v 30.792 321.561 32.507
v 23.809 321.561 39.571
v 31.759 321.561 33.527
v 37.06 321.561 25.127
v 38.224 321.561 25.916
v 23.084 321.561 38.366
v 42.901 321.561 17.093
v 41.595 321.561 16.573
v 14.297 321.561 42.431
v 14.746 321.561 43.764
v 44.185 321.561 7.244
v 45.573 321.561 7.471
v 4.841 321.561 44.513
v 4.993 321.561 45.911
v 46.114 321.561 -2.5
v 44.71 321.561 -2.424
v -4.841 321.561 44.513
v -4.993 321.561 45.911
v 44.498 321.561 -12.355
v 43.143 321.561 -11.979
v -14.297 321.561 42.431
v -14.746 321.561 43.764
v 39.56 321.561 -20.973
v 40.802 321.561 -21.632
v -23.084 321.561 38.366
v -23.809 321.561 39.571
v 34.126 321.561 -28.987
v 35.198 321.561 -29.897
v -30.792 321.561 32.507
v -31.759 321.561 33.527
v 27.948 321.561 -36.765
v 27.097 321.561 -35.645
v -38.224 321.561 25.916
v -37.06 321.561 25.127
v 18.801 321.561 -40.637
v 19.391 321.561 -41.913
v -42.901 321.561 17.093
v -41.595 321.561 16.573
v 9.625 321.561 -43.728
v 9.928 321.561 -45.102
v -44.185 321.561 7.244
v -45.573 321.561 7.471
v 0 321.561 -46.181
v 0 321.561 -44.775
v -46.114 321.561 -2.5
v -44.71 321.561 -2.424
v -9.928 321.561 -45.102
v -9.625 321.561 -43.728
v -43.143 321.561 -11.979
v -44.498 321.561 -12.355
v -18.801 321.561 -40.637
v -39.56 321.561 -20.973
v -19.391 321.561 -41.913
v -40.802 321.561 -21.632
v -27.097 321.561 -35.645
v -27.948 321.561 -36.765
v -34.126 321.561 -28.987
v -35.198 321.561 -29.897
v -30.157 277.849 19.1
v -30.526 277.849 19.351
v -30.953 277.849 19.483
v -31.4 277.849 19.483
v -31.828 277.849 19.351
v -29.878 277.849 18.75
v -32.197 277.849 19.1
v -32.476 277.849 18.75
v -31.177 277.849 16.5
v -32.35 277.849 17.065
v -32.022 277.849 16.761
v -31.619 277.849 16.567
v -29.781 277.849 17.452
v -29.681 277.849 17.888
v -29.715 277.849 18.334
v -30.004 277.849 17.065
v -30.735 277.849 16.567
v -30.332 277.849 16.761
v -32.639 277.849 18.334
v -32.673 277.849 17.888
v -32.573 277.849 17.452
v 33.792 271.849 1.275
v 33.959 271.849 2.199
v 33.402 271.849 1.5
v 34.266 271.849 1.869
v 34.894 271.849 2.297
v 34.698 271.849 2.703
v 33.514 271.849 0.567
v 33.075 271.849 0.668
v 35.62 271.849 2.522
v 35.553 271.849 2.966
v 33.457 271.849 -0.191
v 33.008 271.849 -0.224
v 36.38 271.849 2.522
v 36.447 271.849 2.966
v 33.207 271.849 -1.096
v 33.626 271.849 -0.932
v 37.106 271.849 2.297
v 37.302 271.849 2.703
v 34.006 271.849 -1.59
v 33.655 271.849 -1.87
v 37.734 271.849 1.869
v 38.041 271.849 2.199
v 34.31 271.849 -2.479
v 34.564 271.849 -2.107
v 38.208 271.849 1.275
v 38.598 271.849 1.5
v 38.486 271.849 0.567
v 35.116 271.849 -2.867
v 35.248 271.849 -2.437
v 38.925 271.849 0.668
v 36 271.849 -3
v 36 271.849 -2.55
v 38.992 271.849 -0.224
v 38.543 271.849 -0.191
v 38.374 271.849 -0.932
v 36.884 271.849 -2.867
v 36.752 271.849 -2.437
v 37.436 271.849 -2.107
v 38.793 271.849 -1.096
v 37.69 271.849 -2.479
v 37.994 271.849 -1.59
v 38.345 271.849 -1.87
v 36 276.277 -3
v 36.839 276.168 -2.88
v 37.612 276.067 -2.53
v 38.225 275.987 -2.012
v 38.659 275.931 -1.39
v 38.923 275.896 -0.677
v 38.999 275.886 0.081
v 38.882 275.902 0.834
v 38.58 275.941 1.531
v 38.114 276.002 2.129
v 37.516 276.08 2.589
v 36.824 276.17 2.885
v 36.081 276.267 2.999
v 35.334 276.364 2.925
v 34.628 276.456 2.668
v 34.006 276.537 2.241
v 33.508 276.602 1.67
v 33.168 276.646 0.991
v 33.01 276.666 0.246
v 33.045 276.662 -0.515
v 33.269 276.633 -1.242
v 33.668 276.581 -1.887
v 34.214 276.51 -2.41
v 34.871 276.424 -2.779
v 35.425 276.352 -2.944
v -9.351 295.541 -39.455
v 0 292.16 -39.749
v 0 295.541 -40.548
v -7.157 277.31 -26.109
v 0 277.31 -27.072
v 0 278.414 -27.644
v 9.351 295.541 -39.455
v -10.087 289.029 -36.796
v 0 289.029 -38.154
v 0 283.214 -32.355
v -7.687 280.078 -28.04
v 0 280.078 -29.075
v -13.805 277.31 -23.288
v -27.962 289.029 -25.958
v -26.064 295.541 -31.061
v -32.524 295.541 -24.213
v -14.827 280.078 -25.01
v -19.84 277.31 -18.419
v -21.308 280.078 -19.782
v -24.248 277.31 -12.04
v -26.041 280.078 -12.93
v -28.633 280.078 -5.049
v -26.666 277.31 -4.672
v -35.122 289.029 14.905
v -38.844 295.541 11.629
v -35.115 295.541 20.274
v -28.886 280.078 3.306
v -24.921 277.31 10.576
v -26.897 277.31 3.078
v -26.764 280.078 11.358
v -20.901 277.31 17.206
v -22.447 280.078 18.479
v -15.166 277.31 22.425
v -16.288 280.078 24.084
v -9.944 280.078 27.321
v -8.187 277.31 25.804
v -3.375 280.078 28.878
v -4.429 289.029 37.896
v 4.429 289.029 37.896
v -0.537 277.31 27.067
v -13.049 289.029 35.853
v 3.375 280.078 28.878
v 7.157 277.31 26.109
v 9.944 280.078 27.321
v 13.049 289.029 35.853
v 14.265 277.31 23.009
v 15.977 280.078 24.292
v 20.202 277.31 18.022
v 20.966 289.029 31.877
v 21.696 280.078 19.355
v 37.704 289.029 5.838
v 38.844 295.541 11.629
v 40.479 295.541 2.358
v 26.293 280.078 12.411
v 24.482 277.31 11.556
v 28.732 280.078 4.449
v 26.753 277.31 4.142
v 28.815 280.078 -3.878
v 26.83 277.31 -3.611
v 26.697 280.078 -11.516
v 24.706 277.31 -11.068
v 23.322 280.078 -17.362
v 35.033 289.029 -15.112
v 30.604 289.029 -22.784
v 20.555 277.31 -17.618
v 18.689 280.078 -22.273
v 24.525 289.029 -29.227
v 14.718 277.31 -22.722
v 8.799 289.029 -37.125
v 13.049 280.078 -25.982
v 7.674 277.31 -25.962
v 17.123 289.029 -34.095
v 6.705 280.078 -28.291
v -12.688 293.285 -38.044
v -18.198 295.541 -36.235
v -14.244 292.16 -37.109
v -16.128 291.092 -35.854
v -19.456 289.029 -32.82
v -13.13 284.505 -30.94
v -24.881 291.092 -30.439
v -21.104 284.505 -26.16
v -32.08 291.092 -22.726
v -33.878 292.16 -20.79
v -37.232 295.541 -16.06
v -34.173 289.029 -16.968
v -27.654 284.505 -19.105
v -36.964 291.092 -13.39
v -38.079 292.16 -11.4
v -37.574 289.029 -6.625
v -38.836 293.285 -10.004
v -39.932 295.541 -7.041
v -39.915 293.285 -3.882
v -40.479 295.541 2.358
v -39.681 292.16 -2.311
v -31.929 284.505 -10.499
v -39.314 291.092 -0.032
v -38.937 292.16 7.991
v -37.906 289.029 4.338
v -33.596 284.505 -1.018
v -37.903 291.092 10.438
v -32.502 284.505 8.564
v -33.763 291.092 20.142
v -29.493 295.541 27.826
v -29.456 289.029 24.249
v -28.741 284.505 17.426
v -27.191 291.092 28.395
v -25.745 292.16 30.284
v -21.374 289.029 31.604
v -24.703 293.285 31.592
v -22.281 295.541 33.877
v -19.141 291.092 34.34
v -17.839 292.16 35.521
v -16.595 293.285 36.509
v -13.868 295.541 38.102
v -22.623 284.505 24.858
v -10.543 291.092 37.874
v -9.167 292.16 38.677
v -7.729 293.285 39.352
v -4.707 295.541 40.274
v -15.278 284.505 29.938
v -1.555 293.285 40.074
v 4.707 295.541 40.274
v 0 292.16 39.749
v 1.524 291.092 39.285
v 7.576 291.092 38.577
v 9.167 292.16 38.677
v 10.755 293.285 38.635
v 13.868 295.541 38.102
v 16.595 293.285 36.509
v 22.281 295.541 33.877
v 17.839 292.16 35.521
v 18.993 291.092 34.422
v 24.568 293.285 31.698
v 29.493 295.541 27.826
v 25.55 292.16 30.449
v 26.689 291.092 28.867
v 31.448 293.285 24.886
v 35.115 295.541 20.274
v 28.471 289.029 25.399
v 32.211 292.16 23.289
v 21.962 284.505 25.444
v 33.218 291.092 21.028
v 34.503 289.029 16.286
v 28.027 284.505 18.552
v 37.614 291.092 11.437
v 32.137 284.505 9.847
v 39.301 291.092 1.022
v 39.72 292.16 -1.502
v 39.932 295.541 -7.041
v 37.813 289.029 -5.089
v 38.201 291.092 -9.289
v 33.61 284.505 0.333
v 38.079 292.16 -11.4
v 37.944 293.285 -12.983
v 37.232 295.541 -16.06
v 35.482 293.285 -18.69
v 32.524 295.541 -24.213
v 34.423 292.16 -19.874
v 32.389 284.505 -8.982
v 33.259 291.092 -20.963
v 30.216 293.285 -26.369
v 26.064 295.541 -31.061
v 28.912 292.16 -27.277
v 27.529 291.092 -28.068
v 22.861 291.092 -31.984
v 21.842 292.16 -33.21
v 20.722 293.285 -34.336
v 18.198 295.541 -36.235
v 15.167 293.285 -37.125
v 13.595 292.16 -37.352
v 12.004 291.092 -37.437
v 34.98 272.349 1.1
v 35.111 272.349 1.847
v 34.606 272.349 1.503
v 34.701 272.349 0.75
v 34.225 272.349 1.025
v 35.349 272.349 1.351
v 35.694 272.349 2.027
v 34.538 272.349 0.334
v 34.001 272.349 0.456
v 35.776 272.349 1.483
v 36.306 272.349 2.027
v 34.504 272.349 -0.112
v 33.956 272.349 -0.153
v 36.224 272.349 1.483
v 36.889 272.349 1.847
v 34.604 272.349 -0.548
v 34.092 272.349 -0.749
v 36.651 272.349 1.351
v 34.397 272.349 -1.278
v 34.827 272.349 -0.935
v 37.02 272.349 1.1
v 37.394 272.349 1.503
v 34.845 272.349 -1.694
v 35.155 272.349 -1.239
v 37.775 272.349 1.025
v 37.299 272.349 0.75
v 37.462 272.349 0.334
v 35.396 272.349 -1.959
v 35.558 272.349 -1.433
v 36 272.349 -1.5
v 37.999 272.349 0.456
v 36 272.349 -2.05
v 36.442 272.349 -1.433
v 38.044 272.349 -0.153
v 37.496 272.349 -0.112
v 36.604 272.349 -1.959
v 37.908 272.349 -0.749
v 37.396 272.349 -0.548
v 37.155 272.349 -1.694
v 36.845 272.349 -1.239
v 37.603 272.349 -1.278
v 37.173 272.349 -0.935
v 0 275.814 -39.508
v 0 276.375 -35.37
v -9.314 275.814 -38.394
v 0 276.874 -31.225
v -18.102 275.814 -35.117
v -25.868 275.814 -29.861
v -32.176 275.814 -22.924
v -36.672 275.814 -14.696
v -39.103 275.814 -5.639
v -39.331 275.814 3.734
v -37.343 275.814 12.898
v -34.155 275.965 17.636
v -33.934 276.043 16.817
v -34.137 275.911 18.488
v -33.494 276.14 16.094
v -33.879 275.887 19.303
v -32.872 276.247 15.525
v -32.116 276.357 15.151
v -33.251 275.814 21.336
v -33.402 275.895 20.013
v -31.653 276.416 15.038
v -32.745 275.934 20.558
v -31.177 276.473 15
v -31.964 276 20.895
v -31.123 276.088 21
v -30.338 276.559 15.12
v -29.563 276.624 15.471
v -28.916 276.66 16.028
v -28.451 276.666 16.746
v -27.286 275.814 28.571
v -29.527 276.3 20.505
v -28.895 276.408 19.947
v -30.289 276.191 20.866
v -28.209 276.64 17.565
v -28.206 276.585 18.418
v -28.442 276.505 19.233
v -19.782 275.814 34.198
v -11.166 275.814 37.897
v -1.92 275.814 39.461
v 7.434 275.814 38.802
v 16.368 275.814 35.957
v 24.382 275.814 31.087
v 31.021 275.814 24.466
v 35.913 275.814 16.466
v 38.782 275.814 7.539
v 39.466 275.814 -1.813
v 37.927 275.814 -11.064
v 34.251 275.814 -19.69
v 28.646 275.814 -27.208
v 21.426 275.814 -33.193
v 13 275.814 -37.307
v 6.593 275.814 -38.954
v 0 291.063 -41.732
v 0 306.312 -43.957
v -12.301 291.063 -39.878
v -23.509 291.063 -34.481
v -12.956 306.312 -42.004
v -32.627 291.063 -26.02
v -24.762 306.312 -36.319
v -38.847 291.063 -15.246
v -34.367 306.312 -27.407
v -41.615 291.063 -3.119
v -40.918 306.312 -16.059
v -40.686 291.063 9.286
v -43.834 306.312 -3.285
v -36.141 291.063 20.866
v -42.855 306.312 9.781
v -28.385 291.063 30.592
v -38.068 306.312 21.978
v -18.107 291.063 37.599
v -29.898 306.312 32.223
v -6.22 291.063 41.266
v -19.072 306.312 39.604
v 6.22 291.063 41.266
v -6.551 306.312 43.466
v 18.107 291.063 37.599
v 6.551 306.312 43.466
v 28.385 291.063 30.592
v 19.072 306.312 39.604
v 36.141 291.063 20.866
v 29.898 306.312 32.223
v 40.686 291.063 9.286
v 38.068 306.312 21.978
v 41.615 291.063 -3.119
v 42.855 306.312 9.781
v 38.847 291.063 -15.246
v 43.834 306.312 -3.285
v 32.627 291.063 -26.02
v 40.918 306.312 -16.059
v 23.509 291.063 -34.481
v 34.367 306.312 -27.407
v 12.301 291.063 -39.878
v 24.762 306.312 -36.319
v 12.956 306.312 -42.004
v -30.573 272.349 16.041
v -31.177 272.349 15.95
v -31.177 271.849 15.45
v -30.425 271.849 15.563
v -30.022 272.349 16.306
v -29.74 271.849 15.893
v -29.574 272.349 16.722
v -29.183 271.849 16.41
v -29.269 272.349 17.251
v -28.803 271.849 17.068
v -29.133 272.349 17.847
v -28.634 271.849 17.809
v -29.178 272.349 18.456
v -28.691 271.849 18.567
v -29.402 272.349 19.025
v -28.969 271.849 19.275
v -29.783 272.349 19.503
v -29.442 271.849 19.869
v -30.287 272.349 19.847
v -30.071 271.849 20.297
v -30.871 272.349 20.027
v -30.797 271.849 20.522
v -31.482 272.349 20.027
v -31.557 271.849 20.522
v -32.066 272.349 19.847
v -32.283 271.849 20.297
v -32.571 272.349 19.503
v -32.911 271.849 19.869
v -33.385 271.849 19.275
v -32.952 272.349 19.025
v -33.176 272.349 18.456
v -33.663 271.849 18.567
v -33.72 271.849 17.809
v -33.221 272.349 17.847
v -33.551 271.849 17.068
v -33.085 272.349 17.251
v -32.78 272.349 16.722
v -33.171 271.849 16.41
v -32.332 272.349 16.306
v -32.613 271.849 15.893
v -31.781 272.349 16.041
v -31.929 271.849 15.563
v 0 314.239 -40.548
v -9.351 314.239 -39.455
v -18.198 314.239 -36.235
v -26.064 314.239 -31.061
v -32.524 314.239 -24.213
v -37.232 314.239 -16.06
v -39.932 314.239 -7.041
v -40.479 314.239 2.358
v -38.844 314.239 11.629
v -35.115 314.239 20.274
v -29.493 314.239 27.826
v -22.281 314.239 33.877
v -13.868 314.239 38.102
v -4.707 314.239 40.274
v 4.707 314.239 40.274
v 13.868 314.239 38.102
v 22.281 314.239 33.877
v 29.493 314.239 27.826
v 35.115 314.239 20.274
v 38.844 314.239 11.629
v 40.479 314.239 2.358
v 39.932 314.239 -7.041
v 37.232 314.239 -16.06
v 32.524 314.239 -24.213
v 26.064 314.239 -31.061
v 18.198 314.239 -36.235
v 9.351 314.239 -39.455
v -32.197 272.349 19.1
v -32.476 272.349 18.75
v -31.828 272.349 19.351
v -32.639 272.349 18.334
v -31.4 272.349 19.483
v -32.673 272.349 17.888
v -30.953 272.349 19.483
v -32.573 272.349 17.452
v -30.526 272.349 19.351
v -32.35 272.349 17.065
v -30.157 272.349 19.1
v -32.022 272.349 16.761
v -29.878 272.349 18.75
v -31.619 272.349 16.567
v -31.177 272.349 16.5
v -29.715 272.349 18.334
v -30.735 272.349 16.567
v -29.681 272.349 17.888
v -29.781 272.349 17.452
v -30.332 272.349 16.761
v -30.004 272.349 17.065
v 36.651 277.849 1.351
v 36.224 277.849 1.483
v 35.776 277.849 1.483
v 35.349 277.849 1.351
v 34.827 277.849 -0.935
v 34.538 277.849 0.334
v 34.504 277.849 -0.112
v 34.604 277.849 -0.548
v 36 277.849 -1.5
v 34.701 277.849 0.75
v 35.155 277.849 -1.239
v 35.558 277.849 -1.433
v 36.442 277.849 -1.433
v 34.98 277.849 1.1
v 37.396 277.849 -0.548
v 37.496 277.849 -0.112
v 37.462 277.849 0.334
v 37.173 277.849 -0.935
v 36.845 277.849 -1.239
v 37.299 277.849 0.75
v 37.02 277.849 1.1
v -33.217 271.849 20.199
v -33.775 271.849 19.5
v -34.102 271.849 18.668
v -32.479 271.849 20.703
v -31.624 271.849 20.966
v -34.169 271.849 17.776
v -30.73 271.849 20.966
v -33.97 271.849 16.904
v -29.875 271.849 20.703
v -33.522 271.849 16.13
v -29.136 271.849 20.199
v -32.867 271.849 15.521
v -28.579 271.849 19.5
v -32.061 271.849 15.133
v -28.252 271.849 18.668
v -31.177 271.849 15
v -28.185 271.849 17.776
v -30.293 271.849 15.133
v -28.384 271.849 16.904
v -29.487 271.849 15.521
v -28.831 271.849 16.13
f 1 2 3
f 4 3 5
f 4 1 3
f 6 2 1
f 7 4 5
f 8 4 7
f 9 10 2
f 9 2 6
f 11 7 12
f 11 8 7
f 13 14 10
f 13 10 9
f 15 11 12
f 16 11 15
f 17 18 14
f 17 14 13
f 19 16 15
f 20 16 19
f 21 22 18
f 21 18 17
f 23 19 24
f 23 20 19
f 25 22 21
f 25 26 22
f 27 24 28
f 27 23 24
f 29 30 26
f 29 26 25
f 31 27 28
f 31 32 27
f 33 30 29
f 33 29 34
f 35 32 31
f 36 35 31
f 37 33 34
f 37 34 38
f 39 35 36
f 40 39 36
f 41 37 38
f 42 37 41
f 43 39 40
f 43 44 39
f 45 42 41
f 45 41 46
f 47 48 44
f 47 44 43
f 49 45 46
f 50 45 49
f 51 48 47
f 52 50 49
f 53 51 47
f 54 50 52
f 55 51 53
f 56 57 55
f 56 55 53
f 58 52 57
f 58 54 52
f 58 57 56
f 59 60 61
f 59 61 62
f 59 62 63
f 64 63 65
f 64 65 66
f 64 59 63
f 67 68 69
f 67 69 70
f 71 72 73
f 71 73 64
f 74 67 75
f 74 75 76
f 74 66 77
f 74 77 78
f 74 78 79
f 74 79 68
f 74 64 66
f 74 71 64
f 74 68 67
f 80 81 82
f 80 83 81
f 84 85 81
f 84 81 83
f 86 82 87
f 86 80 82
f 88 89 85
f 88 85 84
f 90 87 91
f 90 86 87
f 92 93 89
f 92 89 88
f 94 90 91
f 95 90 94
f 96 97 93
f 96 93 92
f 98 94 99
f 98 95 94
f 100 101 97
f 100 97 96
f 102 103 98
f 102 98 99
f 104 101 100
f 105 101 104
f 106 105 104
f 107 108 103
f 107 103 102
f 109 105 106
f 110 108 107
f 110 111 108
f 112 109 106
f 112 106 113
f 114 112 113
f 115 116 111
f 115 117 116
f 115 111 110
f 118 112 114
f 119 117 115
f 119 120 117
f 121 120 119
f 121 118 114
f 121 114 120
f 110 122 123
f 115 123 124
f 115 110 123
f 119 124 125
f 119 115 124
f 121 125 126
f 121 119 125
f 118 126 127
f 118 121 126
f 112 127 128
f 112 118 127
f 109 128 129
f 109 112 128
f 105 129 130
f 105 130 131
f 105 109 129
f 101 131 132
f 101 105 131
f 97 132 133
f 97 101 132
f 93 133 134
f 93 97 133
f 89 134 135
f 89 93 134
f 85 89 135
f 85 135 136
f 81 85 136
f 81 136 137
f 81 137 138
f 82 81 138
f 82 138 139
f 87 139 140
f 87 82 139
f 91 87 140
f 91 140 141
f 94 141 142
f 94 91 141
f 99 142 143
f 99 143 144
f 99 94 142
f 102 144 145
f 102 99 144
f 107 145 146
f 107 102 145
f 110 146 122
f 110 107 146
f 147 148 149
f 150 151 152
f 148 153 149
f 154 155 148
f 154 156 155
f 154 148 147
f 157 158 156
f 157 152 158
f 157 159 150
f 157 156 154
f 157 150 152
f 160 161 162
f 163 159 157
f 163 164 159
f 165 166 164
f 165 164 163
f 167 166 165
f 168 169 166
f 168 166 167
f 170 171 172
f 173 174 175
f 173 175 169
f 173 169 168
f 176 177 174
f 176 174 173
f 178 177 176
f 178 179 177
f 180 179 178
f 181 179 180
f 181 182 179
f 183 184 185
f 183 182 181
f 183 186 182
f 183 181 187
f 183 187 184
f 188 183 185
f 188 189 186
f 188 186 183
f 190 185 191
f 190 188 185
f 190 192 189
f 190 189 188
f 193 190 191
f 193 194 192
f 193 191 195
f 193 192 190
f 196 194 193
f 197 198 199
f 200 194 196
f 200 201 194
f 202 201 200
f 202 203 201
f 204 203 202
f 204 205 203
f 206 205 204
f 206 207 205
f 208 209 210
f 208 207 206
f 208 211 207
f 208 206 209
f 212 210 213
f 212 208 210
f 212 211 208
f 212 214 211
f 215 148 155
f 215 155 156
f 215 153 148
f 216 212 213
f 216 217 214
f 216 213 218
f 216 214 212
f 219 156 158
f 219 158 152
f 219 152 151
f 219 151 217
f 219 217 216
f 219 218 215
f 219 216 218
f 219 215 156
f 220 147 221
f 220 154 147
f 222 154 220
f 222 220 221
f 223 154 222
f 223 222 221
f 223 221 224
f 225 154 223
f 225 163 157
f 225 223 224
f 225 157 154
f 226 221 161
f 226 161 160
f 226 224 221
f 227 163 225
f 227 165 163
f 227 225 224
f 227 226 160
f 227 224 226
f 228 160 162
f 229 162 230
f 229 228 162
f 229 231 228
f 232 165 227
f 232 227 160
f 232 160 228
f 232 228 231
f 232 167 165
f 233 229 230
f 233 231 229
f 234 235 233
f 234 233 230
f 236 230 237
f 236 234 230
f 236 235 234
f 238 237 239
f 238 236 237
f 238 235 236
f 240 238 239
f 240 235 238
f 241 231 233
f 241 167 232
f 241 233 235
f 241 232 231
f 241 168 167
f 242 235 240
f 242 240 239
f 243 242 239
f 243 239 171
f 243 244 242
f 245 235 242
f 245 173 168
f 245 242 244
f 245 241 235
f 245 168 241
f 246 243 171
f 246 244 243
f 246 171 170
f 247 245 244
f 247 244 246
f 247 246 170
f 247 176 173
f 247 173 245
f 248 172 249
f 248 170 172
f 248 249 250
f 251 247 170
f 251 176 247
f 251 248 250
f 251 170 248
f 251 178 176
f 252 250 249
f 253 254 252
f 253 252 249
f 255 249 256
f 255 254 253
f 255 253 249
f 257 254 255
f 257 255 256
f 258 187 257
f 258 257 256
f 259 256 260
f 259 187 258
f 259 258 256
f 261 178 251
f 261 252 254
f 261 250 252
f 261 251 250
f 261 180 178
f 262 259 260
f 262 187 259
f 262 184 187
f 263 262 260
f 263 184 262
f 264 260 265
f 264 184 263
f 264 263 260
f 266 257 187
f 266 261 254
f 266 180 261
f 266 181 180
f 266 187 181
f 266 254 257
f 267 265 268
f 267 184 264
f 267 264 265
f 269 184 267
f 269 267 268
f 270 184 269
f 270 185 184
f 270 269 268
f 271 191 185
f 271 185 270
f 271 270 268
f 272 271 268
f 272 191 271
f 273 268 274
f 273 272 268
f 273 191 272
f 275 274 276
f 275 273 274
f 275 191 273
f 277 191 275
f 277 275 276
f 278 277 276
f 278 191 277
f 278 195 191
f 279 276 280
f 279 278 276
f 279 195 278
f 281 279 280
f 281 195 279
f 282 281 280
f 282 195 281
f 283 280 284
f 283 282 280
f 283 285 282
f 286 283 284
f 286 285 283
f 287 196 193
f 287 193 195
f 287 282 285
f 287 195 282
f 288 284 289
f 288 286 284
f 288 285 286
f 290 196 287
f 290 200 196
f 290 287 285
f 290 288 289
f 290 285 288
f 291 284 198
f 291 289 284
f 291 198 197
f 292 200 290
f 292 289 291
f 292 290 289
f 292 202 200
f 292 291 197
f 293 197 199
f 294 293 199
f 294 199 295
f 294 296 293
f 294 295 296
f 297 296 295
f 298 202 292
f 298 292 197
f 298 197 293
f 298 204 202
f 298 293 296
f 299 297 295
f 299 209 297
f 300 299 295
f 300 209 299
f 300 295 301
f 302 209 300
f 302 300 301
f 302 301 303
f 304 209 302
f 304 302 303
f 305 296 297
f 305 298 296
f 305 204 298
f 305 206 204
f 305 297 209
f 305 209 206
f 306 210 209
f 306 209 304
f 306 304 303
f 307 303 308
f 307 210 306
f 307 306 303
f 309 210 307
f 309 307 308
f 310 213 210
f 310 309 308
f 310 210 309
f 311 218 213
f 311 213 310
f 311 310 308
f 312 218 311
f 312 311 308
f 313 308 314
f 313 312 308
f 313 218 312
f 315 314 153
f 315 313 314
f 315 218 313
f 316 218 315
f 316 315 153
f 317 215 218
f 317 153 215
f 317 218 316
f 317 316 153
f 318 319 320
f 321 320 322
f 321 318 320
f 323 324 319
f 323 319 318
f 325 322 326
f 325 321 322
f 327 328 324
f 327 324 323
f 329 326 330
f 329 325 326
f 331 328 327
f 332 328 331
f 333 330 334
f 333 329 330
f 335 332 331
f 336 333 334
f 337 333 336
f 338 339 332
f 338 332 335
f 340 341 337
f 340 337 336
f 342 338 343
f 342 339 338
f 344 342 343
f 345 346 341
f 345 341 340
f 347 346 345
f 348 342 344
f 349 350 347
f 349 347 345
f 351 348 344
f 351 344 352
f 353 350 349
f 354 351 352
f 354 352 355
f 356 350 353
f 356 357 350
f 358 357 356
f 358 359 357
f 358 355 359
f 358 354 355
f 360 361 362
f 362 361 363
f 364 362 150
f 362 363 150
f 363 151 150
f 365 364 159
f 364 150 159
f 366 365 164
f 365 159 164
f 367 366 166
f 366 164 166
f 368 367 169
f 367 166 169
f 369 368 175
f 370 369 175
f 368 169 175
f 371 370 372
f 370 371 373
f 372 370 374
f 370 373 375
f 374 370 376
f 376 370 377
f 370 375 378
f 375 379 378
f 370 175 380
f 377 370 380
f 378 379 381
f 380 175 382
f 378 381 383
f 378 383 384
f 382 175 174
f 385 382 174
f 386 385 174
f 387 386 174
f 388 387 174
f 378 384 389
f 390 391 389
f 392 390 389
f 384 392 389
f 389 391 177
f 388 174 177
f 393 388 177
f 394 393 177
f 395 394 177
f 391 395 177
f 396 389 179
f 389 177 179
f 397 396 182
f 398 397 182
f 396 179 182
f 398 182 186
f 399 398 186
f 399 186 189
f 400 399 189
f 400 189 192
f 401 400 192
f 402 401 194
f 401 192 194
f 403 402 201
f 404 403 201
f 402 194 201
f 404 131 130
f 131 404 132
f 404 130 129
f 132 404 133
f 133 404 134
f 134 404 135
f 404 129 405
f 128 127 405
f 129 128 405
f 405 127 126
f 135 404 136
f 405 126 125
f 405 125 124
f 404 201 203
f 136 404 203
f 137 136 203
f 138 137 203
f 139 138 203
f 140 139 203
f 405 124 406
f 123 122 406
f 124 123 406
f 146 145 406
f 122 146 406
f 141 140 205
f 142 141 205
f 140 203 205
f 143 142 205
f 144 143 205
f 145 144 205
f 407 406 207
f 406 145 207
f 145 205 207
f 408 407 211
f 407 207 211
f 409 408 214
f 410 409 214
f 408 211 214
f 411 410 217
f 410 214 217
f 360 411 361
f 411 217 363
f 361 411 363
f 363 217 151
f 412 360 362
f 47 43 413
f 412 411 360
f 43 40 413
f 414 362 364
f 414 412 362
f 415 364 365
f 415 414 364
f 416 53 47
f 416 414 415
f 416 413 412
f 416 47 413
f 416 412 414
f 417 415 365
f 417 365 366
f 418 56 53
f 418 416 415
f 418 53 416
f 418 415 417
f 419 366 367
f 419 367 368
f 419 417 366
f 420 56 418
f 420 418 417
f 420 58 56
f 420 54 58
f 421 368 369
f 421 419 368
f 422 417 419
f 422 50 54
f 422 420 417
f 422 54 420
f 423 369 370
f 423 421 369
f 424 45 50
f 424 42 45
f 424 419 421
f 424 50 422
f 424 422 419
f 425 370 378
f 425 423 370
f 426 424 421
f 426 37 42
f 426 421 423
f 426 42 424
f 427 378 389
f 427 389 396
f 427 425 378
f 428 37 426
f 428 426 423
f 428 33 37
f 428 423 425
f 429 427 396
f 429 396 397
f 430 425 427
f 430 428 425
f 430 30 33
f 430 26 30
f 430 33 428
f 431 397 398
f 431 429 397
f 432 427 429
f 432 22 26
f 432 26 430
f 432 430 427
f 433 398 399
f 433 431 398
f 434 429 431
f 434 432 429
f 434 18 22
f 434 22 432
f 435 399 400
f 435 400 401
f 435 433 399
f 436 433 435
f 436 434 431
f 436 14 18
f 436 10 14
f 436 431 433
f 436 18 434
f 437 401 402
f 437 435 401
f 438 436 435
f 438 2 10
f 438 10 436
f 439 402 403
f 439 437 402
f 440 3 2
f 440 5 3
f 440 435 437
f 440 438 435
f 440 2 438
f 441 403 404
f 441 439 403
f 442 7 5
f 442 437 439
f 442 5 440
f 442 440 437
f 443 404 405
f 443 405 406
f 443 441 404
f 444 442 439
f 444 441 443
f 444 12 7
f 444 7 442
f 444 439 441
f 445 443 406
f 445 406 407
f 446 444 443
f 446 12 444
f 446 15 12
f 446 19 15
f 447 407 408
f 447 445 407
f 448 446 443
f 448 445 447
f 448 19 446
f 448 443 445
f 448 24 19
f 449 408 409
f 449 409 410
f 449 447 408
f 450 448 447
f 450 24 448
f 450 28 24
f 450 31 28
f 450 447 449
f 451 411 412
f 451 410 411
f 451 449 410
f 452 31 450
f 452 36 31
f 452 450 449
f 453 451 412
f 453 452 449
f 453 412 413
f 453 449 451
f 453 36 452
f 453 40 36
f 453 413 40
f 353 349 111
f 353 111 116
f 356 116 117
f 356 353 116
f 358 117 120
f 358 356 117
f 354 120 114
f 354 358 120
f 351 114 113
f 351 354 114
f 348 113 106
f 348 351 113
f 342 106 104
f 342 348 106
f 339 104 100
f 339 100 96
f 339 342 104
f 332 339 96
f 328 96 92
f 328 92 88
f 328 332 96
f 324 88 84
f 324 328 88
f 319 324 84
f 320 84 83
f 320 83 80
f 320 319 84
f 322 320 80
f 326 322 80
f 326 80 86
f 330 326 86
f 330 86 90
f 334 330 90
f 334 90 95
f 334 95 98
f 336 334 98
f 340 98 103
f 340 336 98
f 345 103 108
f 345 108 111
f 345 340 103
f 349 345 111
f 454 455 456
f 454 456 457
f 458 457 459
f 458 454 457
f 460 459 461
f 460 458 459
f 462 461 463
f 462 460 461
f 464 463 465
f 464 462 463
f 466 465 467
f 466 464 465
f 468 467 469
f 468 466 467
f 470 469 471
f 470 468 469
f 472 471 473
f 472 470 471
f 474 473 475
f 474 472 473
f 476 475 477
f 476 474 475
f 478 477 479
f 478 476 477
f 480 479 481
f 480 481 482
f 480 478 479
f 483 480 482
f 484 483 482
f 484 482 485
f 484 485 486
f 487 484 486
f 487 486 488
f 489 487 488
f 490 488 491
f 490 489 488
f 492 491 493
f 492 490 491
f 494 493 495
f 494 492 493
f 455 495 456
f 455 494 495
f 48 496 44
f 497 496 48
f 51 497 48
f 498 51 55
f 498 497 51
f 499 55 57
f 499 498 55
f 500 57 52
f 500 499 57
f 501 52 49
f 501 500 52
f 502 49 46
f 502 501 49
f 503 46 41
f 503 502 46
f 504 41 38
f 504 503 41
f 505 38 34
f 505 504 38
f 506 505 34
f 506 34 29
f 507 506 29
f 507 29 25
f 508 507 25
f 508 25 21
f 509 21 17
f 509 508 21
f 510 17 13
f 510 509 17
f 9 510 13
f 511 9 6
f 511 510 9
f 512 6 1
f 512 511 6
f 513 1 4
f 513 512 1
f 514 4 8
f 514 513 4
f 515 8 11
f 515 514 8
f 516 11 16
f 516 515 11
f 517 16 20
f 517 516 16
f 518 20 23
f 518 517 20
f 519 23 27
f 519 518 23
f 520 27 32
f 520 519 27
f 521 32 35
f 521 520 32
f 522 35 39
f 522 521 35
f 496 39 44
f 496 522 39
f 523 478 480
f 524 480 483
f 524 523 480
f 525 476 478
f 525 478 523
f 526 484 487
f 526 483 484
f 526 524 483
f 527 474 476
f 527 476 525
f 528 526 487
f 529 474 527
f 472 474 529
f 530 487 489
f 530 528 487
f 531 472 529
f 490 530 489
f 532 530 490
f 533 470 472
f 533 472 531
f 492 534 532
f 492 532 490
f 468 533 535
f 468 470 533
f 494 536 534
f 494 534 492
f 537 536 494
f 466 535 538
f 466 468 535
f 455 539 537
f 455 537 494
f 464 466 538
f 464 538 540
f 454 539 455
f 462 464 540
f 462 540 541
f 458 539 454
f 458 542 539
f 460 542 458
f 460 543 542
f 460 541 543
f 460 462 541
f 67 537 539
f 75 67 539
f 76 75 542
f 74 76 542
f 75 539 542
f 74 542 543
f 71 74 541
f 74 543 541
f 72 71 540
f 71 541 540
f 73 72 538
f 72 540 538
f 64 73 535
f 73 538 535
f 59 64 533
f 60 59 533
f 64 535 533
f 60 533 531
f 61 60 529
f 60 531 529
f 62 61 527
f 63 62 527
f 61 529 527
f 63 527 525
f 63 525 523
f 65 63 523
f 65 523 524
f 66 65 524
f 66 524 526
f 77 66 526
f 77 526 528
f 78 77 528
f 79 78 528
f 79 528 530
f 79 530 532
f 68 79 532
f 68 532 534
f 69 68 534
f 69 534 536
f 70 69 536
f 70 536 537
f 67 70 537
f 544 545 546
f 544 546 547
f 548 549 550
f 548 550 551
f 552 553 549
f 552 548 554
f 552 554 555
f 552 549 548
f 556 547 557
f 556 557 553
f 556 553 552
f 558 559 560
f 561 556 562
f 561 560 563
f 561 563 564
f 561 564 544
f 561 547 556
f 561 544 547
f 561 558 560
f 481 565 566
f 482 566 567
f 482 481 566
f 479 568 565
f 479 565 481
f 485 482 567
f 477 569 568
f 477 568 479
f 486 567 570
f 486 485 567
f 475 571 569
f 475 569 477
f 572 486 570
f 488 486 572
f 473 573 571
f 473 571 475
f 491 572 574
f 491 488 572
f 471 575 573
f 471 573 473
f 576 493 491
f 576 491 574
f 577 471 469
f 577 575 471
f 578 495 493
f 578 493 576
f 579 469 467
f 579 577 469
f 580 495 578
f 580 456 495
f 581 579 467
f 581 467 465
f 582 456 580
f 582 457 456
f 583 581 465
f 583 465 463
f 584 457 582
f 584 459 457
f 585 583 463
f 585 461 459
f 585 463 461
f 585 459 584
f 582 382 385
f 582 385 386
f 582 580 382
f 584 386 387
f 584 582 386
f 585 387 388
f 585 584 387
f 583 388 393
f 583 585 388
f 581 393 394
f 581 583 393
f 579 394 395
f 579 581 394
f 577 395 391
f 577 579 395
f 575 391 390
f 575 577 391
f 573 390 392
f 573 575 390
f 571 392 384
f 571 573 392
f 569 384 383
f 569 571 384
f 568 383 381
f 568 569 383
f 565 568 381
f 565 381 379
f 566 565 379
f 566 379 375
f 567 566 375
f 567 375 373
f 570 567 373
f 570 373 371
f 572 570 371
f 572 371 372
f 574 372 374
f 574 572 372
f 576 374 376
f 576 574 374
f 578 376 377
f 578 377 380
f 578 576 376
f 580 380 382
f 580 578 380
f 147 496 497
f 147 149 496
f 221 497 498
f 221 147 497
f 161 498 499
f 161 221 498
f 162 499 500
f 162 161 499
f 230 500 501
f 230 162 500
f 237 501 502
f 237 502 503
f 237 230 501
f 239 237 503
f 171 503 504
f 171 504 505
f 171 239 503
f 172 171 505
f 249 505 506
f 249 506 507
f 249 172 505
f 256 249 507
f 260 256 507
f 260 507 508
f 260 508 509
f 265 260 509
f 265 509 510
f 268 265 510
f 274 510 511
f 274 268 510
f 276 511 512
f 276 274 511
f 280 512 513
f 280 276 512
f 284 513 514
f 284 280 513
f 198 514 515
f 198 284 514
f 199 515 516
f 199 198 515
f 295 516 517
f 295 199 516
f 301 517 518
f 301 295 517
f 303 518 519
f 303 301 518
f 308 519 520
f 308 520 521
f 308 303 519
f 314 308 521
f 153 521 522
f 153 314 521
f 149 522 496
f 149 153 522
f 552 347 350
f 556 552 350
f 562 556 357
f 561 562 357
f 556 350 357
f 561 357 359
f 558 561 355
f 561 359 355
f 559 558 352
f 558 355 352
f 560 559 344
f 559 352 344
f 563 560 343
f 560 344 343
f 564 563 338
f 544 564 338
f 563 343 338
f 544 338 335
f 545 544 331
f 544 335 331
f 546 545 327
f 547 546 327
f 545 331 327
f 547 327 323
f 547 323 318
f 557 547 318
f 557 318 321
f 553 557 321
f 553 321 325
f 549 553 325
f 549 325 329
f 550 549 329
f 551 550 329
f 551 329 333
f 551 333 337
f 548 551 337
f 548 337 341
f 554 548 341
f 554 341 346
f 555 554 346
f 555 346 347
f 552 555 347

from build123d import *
from OCP.BRepAlgoAPI import BRepAlgoAPI_Cut
from OCP.TopTools import TopTools_ListOfShape

# Parameters (mm, degrees)
SKETCH4_R                       = 3
BOSS_EXTRUDE1_DEPTH             = 2
SKETCH4_2_R                     = 3
BOSS_EXTRUDE3_DEPTH             = 2
BOSS_EXTRUDE3_DIRECTION_2_REACH = 82.882
SKETCH13_R                      = 1.5
CUT_EXTRUDE1_DEPTH              = 6
SKETCH14_R                      = 2
CUT_EXTRUDE2_DEPTH              = 0.5
CHAMFER3_SIZE                   = 0.55


with BuildPart() as part:
    # Sketch2 → Revolve6 (revolve)
    with BuildSketch(Plane(origin=(0, 0, 0), x_dir=(0, 0, -1), z_dir=(1, 0, 0))):
        with BuildLine():
            Line((26.5077562, 274.996982717), (26.5077562, 273.848618937))
            Line((26.5077562, 273.848618937), (39.220771912, 273.848618937))
            Line((39.220771912, 273.848618937), (46.181267187, 321.561079724))
            Line((46.181267187, 321.561079724), (44.775299462, 321.561079724))
            Line((44.775299462, 321.561079724), (40.547674755, 314.238618937))
            Line((40.547674755, 314.238618937), (40.547674755, 295.540718438))
            add(Edge.make_bspline(
                [(40.547674755, 295.540718438), (40.447740466, 295.012709616), (40.292777353, 293.970757619), (39.930889755, 292.587532753), (39.516186416, 291.581451359), (39.108370782, 290.57804728), (38.439698054, 289.316986818), (37.331416086, 288.032583079), (36.368363881, 287.115418474), (35.630231264, 286.340079673), (35.016472726, 285.762737126), (34.394259795, 285.247169223), (33.635524662, 284.556557999), (32.920361334, 283.771384038), (32.129651901, 282.986073936), (31.485241784, 282.459482323), (30.914997208, 281.963476573), (30.371700346, 281.391298159), (29.782796159, 280.80462685), (29.227584581, 280.262154528), (28.724752618, 279.674853681), (28.180386253, 279.039651715), (27.651838315, 278.470209992), (27.308145935, 277.876839187), (26.995230081, 277.127164256), (26.597952618, 276.164510632), (26.464811583, 275.470548141), (26.5077562, 274.996982717)],
                knots=[0, 0, 0, 0, 0.062544048, 0.125088096, 0.156360121, 0.187632145, 0.250176193, 0.312720241, 0.375264289, 0.406536313, 0.437808337, 0.469080362, 0.500352386, 0.562896434, 0.594168458, 0.625440482, 0.656712506, 0.68798453, 0.719256554, 0.750528579, 0.781800603, 0.813072627, 0.844344651, 0.875616675, 0.906888699, 0.938160723, 1.000704771, 1.000704771, 1.000704771, 1.000704771], degree=3))
        make_face()
    revolve(axis=Axis((0, 5, 0), (0, 1, 0)))

    # Sketch4 → Boss-Extrude1 (add)
    with BuildSketch(Plane.XZ.offset(-273.848618937)):
        with Locations(Location((-31.176914536, 18, 0), (0, 0, 270))):
            Circle(SKETCH4_R)
        with Locations(Location((36, 0, 0), (0, 0, 270))):
            Circle(SKETCH4_R)
    extrude(amount=BOSS_EXTRUDE1_DEPTH)

    # Sketch7 → Revolve7 (revolve)
    with BuildSketch(Plane(origin=(0, 0, 0), x_dir=(0, 0, -1), z_dir=(1, 0, 0))):
        with BuildLine():
            Line((39.220771912, 273.848618937), (39.220771912, 272.319355593))
            ThreePointArc((39.220771912, 272.319355593), (32.873157949, 273.157923648), (26.5077562, 273.848618937))
            Line((26.5077562, 273.848618937), (26.5077562, 274.348618937))
            Line((26.5077562, 274.348618937), (39.220771912, 274.348618937))
            Line((39.220771912, 274.348618937), (39.220771912, 273.848618937))
        make_face()
    revolve(axis=Axis((0, 5, 0), (0, 1, 0)))


with BuildPart() as cut_revolve3_tool:
    # Sketch12 → Cut-Revolve3 (revolve)
    with BuildSketch(Plane(origin=(0, 0, 0), x_dir=(0, 0, -1), z_dir=(1, 0, 0))):
        with BuildLine():
            Line((26.0877562, 277.404557538), (26.0877562, 267.404557538))
            Line((26.0877562, 267.404557538), (40.0877562, 267.404557538))
            Line((40.0877562, 267.404557538), (40.0877562, 275.730375326))
            ThreePointArc((40.0877562, 275.730375326), (33.098343341, 276.655999187), (26.0877562, 277.404557538))
        make_face()
    revolve(axis=Axis((0, 5, 0), (0, 1, 0)))


with BuildPart() as part_1:
    add(part.part)

    # Cut-Revolve3: cut by cut_revolve3_tool, with a tolerance
    cut_revolve3_stock = TopTools_ListOfShape()
    cut_revolve3_stock.Append(part_1.part.wrapped)
    cut_revolve3_tools = TopTools_ListOfShape()
    cut_revolve3_tools.Append(cut_revolve3_tool.part.wrapped)
    cut_revolve3_cut = BRepAlgoAPI_Cut()
    cut_revolve3_cut.SetArguments(cut_revolve3_stock)
    cut_revolve3_cut.SetTools(cut_revolve3_tools)
    cut_revolve3_cut.SetFuzzyValue(0.00001)
    cut_revolve3_cut.Build()
    add(Compound.cast(cut_revolve3_cut.Shape()).solids(), mode=Mode.REPLACE)

    # Sketch4<2> → Boss-Extrude3 (add)
    with BuildSketch(Plane.XZ.offset(-273.848618937)):
        with Locations(Location((-31.176914536, 18, 0), (0, 0, 270))):
            Circle(SKETCH4_2_R)
        with Locations(Location((36, 0, 0), (0, 0, 270))):
            Circle(SKETCH4_2_R)
    extrude(amount=BOSS_EXTRUDE3_DEPTH)

    # Sketch4<2> → Boss-Extrude3 direction 2 (add, up to next)
    with BuildSketch(Plane.XZ.offset(-273.848618937), mode=Mode.PRIVATE) as boss_extrude3_direction_2_sk1:
        with Locations(Location((-31.176914536, 18, 0), (0, 0, 270))):
            Circle(SKETCH4_2_R)
    boss_extrude3_direction_2_tool1 = extrude(boss_extrude3_direction_2_sk1.sketch, amount=-BOSS_EXTRUDE3_DIRECTION_2_REACH, mode=Mode.PRIVATE) - part_1.part
    # Sketch4<2> → Boss-Extrude3 direction 2 (add, up to next)
    with BuildSketch(Plane.XZ.offset(-273.848618937), mode=Mode.PRIVATE) as boss_extrude3_direction_2_sk2:
        with Locations(Location((36, 0, 0), (0, 0, 270))):
            Circle(SKETCH4_2_R)
    boss_extrude3_direction_2_tool2 = extrude(boss_extrude3_direction_2_sk2.sketch, amount=-BOSS_EXTRUDE3_DIRECTION_2_REACH, mode=Mode.PRIVATE) - part_1.part
    add(boss_extrude3_direction_2_tool1.solids().sort_by_distance((-31.176915, 273.848619, 18))[0])
    add(boss_extrude3_direction_2_tool2.solids().sort_by_distance((36, 273.848619, 0))[0])

    # Sketch13 → Cut-Extrude1 (cut)
    with BuildSketch(Plane.XZ.offset(-271.848618937)):
        with Locations(Location((-31.176914536, 18, 0), (0, 0, 270))):
            Circle(SKETCH13_R)
        with Locations(Location((36, 0, 0), (0, 0, 270))):
            Circle(SKETCH13_R)
    extrude(amount=-CUT_EXTRUDE1_DEPTH, mode=Mode.SUBTRACT)

    # Sketch14 → Cut-Extrude2 (cut)
    with BuildSketch(Plane.XZ.offset(-271.848618937)):
        with Locations(Location((-31.176914536, 18, 0), (0, 0, 270))):
            Circle(SKETCH14_R)
        with Locations(Location((36, 0, 0), (0, 0, 270))):
            Circle(SKETCH14_R)
    extrude(amount=-CUT_EXTRUDE2_DEPTH, mode=Mode.SUBTRACT)

    # Chamfer3
    # the kernel refuses this chamfer: 0.55 mm, written as the material it takes off along each edge
    with BuildSketch(Plane(origin=(36, 271.848618937, 0), x_dir=(0, 0, -1), z_dir=(-1, 0, 0))) as chamfer3_piece_1_section:
        Polygon((2 + CHAMFER3_SIZE, 0), (2, -CHAMFER3_SIZE), (2, 0), align=None)
    chamfer3_piece_1 = revolve(axis=Axis((36, 271.848618937, 0), (0, -1, 0)), mode=Mode.PRIVATE)
    chamfer3_piece_1 = split(chamfer3_piece_1, bisect_by=Plane(origin=(36, 272.348618937, 0), z_dir=(0, -1, 0)), keep=Keep.TOP, mode=Mode.PRIVATE)
    add(chamfer3_piece_1, mode=Mode.SUBTRACT)
    with BuildSketch(Plane(origin=(-31.176914536, 271.848618937, 18), x_dir=(0, 0, -1), z_dir=(-1, 0, 0))) as chamfer3_piece_2_section:
        Polygon((2 + CHAMFER3_SIZE, 0), (2, -CHAMFER3_SIZE), (2, 0), align=None)
    chamfer3_piece_2 = revolve(axis=Axis((-31.176914536, 271.848618937, 18), (0, -1, 0)), mode=Mode.PRIVATE)
    chamfer3_piece_2 = split(chamfer3_piece_2, bisect_by=Plane(origin=(-31.176914536, 272.348618937, 18), z_dir=(0, -1, 0)), keep=Keep.TOP, mode=Mode.PRIVATE)
    add(chamfer3_piece_2, mode=Mode.SUBTRACT)


solid = part_1.part
